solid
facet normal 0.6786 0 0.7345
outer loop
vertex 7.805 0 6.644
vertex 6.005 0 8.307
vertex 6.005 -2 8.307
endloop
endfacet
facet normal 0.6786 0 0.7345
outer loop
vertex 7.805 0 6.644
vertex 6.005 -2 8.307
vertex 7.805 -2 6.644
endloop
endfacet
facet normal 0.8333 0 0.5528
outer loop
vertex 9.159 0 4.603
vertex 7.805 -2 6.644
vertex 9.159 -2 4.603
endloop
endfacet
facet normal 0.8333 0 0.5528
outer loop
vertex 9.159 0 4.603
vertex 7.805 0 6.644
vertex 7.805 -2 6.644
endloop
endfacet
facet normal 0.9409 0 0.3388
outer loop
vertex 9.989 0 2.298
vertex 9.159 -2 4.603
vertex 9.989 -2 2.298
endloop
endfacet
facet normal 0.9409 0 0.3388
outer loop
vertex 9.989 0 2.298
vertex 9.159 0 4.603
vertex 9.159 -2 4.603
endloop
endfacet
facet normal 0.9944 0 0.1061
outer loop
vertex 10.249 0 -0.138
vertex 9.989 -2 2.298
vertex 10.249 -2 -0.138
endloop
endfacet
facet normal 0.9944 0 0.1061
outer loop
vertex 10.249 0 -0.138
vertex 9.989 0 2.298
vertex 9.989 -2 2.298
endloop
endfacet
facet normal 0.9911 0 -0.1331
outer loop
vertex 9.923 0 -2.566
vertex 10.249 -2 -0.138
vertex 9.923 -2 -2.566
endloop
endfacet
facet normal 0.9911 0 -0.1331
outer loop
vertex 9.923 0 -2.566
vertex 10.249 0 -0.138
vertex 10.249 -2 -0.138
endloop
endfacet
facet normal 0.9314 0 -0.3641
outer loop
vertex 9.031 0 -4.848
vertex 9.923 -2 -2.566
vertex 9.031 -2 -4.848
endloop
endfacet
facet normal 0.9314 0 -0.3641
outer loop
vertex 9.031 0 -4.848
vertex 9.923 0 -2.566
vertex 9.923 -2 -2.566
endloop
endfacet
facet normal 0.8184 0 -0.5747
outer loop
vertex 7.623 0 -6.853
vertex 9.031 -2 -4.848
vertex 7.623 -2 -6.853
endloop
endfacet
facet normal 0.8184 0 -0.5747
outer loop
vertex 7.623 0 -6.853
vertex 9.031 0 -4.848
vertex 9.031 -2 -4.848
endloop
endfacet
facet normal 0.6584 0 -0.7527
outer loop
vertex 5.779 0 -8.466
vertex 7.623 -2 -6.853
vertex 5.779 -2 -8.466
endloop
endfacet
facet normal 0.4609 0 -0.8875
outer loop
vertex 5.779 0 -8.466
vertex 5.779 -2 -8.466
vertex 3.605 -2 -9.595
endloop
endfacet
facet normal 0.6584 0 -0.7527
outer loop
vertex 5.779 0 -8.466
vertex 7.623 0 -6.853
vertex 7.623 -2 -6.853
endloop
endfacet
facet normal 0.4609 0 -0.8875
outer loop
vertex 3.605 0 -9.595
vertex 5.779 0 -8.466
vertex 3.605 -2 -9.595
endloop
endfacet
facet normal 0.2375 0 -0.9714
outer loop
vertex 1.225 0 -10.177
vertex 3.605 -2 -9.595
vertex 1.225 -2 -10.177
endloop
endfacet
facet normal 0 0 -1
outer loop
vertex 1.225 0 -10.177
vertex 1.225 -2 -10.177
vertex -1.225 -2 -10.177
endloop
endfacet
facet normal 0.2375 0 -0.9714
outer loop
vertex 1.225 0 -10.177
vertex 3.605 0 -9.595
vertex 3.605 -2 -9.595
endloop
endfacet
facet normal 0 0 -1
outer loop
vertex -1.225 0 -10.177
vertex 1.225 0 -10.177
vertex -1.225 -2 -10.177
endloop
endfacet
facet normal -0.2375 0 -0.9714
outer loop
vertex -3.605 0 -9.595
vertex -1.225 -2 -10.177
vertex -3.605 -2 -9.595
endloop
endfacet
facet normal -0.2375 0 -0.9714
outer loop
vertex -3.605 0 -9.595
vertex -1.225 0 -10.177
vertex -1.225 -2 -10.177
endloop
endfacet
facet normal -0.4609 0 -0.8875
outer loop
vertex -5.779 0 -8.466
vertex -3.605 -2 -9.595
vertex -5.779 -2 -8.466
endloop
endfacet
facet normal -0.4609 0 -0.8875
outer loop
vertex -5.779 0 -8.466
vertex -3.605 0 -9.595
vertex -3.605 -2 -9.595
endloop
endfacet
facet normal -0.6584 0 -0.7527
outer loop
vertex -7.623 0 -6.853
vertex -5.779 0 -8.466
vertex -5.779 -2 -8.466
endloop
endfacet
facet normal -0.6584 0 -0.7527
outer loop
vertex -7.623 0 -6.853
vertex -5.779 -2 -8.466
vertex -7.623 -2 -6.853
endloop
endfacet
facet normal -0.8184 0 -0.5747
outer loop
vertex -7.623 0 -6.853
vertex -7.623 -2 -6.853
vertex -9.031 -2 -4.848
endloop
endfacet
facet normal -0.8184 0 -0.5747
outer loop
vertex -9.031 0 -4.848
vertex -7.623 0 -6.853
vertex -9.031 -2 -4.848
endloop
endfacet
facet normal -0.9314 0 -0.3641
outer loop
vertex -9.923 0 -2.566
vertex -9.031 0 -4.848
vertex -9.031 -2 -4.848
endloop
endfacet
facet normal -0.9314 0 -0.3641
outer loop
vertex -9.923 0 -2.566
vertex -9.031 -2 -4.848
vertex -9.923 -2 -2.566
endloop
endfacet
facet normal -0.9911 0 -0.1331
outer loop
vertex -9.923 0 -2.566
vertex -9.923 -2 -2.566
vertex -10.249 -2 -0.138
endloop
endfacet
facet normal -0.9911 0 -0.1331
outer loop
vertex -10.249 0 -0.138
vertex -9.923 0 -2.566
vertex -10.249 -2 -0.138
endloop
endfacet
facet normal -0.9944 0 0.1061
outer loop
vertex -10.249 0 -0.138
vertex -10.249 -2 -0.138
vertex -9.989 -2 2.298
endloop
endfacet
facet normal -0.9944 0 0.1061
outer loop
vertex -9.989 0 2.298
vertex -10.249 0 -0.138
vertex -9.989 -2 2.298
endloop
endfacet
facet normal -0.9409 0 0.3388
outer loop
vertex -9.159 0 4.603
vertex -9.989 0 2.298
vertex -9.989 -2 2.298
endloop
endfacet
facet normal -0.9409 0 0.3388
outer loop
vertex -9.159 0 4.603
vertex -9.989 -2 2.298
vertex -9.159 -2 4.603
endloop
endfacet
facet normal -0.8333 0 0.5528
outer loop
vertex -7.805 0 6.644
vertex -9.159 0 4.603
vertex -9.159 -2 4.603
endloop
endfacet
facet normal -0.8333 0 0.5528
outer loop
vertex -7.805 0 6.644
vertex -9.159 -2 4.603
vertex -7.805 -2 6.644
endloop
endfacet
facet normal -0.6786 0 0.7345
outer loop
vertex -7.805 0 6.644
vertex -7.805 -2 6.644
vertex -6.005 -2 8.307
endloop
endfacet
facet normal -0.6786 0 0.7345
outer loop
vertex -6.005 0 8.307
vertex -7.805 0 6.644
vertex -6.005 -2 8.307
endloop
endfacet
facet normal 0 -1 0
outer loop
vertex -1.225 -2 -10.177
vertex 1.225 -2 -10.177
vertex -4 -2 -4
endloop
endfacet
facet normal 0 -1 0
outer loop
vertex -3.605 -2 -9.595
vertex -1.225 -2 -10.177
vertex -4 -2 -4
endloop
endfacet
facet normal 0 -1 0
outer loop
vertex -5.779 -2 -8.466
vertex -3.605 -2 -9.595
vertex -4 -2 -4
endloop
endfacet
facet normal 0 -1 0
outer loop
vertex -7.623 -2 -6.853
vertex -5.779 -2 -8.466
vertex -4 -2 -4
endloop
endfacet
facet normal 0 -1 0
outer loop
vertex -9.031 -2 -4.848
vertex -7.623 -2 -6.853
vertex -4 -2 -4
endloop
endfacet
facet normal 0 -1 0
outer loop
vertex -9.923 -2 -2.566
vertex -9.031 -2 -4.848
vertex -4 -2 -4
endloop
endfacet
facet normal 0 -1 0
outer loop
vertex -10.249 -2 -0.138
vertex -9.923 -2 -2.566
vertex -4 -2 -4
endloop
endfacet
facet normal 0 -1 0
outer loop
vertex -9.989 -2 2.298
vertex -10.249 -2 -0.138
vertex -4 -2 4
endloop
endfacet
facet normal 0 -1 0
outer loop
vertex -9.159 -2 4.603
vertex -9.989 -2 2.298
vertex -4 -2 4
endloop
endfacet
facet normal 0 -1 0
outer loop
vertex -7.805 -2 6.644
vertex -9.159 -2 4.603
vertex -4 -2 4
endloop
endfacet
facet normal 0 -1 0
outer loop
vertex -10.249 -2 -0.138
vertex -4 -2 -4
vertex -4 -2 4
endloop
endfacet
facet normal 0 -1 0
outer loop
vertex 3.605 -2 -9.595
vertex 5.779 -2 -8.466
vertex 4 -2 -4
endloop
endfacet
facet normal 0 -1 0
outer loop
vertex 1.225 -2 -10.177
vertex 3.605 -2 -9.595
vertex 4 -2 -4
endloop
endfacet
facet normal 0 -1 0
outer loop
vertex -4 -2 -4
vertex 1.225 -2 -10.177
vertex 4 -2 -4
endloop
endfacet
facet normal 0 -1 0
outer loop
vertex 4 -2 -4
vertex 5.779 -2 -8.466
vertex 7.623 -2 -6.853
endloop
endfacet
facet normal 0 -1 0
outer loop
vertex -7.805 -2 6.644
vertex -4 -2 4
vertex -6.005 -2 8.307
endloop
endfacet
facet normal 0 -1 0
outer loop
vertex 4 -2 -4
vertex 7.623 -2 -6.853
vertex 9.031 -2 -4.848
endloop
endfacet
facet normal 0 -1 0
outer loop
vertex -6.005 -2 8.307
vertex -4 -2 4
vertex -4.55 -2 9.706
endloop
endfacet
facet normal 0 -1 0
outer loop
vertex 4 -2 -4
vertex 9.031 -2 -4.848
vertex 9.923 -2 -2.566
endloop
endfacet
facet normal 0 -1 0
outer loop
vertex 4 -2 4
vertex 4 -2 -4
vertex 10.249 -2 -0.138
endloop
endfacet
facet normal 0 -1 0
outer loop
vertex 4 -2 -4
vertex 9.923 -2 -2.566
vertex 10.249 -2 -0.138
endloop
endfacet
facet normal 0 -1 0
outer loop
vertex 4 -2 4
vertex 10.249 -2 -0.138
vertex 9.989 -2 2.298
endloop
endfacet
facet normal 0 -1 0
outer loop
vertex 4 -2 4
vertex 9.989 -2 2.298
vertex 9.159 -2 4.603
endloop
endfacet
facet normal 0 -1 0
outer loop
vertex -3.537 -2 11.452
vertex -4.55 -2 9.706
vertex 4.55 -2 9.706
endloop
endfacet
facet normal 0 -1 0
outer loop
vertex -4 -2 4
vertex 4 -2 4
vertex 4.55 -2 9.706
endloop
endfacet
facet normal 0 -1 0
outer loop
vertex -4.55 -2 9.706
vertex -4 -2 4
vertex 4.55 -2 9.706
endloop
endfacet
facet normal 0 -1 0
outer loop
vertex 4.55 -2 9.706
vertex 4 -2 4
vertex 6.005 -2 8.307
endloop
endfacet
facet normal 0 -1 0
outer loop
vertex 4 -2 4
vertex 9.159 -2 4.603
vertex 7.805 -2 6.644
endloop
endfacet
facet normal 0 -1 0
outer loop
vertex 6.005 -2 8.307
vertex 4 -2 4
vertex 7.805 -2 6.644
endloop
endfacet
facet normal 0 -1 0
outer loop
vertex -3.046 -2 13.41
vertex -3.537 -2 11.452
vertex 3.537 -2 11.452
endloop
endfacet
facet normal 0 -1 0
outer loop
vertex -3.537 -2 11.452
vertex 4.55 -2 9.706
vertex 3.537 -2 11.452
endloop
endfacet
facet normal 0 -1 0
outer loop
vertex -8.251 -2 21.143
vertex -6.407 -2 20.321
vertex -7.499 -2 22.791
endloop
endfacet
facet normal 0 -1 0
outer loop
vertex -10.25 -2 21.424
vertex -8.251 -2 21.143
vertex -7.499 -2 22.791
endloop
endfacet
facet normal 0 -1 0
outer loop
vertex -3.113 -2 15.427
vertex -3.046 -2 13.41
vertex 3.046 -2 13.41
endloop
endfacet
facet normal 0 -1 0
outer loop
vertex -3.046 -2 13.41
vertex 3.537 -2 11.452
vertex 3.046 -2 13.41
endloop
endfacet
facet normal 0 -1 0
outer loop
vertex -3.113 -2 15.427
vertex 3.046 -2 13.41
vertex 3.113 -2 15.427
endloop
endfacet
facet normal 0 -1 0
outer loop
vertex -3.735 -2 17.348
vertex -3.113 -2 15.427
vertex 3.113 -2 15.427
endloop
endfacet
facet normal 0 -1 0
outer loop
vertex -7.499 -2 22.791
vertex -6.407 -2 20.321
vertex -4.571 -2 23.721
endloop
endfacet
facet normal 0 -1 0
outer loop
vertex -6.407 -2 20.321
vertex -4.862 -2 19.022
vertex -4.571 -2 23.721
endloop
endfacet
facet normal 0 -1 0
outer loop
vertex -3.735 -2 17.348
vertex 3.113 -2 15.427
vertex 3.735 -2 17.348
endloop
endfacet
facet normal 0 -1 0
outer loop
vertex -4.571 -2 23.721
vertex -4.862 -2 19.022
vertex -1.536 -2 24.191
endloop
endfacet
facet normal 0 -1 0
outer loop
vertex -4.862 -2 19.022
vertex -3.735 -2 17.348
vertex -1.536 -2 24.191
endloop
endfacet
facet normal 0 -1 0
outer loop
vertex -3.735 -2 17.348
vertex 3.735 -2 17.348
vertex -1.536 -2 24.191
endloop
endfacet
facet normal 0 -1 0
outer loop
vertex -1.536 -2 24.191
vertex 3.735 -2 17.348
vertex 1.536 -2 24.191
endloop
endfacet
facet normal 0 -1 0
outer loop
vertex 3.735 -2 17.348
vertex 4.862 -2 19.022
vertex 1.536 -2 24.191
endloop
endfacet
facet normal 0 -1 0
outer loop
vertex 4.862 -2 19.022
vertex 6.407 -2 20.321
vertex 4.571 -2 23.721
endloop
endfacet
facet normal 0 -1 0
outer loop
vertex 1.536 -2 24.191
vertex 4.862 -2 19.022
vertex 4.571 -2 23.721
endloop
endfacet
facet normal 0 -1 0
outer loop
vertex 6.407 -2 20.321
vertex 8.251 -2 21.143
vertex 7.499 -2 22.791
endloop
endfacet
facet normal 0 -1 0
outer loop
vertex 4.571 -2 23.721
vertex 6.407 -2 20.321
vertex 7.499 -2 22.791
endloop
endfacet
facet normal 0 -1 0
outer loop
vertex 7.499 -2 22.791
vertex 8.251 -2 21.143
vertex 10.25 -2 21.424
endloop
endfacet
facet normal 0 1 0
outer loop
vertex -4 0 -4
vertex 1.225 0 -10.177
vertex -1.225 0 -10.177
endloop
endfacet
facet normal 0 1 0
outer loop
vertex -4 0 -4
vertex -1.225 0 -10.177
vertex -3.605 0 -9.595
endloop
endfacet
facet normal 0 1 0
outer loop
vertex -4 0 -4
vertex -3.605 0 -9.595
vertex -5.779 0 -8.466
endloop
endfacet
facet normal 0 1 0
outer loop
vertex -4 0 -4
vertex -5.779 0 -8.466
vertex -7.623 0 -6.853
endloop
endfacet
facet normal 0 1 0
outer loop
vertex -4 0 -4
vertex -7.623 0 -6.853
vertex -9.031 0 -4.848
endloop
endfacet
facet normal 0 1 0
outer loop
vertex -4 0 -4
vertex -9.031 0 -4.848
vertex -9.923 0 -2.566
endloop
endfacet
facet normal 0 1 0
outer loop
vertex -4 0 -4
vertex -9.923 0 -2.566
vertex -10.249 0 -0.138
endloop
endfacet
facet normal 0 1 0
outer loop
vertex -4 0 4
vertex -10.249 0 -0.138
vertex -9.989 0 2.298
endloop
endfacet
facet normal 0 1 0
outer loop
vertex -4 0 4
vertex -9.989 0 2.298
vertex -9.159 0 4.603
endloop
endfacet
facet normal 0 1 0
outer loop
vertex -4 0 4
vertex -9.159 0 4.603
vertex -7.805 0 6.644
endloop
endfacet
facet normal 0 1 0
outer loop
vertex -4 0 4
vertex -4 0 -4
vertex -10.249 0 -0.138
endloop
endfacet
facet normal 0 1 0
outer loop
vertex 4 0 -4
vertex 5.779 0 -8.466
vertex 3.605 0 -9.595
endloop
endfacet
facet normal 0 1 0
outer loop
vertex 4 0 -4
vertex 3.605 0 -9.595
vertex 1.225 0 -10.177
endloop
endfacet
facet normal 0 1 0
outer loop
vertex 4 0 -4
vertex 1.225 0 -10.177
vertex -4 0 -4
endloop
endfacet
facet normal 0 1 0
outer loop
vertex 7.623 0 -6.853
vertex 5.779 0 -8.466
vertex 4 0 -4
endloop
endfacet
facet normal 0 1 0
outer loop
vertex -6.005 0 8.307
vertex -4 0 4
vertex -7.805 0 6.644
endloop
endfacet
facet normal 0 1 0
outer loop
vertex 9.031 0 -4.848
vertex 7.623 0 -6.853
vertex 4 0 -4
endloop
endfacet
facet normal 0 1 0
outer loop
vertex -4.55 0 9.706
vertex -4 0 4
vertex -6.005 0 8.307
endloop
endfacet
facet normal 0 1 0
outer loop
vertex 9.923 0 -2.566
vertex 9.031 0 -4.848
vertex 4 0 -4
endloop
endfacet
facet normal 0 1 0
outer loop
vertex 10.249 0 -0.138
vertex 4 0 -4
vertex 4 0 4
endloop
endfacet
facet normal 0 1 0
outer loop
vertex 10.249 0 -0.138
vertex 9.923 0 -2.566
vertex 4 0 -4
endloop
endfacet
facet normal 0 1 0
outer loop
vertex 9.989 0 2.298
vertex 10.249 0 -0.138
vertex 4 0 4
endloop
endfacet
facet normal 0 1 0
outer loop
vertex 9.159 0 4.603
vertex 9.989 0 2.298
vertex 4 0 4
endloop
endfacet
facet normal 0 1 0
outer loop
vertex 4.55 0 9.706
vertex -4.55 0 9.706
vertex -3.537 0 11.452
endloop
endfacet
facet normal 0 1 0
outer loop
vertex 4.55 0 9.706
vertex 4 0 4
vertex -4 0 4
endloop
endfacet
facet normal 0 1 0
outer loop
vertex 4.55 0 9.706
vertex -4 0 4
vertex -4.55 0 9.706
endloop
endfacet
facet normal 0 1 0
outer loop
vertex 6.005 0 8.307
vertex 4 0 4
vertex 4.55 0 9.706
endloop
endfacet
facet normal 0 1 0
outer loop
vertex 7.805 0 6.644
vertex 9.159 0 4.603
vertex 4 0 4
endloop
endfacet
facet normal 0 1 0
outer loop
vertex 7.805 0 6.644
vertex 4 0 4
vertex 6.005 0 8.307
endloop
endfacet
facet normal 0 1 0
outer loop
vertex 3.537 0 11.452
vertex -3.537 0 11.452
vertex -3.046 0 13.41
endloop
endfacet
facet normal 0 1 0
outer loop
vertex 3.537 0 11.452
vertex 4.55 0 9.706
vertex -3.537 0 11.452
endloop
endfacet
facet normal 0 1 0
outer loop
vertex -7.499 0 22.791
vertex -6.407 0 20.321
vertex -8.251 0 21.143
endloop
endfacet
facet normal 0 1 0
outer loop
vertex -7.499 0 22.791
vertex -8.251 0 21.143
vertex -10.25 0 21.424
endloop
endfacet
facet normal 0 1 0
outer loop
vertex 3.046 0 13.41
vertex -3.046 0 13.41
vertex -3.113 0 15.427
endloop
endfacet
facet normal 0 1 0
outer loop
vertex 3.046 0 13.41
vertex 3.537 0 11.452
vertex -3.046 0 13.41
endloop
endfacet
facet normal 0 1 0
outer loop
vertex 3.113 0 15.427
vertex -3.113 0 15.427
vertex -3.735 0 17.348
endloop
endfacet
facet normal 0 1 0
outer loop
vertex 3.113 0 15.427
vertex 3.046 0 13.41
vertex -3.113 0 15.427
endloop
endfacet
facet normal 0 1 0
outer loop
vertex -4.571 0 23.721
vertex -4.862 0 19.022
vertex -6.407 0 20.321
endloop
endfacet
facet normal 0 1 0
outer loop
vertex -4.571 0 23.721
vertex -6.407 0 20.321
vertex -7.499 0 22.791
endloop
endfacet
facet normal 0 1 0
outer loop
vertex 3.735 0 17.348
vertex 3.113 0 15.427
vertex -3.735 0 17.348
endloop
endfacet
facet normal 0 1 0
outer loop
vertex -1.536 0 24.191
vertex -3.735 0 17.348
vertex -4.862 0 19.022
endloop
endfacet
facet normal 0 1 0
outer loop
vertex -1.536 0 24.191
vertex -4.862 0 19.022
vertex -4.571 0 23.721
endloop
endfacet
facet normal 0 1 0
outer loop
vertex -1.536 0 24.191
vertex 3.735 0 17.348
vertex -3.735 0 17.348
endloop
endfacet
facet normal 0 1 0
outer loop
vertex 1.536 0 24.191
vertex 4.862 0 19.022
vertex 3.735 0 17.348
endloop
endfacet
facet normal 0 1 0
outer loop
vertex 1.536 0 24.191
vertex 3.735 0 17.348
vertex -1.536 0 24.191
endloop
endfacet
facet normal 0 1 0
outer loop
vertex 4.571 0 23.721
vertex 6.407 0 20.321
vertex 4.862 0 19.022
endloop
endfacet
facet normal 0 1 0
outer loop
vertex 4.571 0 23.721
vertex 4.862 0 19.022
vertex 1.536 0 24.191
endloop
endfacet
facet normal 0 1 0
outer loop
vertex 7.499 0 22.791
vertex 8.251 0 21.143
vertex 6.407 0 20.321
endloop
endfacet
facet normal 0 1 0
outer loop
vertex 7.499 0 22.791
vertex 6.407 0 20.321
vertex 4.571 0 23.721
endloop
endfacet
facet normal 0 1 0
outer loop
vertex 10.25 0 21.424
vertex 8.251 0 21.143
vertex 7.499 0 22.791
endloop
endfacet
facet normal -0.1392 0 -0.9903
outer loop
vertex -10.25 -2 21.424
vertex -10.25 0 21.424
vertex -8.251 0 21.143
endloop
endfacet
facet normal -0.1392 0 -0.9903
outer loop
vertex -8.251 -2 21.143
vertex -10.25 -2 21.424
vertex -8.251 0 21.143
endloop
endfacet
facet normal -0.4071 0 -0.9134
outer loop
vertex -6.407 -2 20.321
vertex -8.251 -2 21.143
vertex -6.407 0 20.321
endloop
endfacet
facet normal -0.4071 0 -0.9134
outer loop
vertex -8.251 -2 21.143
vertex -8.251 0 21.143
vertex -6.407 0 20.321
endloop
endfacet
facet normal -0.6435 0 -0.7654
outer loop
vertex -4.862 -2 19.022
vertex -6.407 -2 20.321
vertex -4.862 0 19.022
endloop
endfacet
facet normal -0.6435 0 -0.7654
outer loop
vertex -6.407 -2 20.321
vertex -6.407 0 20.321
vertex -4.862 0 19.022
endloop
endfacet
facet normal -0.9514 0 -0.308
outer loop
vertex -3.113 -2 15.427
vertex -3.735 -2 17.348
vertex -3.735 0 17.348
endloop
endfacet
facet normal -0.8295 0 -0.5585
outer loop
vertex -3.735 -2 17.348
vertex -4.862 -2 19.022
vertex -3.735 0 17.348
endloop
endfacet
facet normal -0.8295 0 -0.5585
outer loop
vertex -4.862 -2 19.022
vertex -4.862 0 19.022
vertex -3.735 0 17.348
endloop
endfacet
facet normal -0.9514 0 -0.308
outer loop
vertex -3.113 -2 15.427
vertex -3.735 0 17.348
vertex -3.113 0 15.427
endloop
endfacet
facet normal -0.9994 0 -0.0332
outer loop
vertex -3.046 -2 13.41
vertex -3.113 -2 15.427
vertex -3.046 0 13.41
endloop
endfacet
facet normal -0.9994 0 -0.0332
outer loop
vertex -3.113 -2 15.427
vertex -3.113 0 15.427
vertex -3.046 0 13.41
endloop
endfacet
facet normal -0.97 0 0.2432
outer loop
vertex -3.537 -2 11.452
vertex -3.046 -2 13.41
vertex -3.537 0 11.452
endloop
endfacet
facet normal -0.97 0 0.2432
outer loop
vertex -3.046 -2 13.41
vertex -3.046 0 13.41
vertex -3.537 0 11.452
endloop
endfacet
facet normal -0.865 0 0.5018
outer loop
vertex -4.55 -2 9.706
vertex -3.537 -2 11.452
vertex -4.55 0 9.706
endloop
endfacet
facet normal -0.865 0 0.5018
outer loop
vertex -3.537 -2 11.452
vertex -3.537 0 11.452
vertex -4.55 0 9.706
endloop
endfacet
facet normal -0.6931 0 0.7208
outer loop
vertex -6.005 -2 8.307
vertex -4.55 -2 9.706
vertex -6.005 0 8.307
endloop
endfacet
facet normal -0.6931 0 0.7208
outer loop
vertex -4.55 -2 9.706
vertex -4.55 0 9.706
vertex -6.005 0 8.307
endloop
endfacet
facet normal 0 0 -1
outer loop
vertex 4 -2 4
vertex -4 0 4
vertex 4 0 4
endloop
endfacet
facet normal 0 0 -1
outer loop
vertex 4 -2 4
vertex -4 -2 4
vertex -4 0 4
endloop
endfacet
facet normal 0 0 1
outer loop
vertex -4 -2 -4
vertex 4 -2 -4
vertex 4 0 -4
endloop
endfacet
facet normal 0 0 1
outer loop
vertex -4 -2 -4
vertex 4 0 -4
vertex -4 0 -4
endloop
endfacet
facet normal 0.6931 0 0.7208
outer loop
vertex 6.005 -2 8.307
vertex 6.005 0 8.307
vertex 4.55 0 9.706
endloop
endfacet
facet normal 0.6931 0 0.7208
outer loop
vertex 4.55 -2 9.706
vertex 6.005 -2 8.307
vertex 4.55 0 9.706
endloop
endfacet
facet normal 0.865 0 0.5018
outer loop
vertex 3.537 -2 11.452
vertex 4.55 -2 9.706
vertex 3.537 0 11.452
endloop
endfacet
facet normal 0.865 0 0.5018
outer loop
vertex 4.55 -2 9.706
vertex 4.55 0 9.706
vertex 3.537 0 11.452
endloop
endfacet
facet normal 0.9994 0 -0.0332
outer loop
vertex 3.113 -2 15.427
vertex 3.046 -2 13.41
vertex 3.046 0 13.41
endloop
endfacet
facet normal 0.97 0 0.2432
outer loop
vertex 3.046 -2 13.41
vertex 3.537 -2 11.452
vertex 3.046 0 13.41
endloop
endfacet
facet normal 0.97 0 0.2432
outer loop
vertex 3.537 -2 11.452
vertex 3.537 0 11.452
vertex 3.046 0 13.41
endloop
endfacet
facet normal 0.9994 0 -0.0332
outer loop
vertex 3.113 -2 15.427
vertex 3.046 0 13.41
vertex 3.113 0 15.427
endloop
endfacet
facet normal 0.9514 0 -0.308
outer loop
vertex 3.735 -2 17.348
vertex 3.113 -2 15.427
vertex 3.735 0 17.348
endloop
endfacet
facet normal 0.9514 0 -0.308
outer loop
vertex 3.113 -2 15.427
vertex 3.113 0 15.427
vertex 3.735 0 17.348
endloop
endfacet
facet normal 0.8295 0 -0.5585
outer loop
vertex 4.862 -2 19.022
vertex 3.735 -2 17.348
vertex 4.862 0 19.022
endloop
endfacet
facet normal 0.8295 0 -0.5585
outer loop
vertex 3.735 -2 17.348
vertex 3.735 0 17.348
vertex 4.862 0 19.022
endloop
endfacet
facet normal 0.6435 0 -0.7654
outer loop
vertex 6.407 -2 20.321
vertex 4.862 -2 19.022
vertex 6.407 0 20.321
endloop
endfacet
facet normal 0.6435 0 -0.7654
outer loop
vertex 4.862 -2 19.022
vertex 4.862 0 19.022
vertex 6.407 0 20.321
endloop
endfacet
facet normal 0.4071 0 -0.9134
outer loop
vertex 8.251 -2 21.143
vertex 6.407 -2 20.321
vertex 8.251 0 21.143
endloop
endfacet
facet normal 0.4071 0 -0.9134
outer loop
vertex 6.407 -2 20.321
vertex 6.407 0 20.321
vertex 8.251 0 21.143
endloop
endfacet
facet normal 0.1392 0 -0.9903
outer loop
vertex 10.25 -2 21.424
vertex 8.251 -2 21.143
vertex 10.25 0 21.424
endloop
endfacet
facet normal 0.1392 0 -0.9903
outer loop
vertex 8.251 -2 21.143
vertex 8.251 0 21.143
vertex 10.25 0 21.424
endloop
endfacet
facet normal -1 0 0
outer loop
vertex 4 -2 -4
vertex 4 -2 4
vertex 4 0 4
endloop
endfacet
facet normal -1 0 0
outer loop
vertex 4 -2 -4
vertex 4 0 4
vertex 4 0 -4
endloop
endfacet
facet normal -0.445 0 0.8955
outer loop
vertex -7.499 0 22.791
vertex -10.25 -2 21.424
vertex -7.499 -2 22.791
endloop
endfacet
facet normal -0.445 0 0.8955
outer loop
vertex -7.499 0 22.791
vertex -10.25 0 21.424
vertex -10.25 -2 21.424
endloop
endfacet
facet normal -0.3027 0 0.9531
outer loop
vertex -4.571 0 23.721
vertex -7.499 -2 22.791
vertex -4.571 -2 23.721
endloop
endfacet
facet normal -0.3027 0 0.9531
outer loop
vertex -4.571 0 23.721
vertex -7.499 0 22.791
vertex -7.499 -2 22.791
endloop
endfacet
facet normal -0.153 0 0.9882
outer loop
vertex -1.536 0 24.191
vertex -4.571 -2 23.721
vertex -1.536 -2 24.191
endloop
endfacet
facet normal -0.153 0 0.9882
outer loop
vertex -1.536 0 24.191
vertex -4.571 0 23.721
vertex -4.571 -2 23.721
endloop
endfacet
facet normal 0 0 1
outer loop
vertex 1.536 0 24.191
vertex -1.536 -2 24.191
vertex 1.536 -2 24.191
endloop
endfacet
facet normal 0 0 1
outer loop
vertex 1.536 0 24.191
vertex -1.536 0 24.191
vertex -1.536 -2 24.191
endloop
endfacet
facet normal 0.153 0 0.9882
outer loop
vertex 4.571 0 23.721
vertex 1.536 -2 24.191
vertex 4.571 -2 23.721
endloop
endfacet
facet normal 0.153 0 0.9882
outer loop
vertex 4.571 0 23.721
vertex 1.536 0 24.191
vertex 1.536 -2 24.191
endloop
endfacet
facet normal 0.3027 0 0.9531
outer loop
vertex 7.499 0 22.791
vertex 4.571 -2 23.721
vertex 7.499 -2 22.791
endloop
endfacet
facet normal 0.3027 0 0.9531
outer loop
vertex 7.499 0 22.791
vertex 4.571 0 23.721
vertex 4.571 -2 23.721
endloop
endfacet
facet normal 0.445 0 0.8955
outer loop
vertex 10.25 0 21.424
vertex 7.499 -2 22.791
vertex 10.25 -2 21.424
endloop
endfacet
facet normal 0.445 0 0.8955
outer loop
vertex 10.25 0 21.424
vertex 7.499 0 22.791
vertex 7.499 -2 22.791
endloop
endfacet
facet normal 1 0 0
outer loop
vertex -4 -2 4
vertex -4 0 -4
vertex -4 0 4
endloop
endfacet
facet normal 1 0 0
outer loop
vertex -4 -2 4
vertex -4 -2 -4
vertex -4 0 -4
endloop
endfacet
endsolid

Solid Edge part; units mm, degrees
sketch "Sketch1" plane through (0, 0, 0) normal (0, -1, 0) x (1, 0, 0)
  arc A0 (-6.0052, 8.3067) -> (-10.25, 21.4237) centre (-10.25, 14.1784) ccw
  arc A1 (-10.25, 21.4237) -> (10.25, 21.4237) centre (0, 4.25) cw
  arc A2 (10.25, 21.4237) -> (6.0052, 8.3067) centre (10.25, 14.1784) ccw
  arc A3 (6.0052, 8.3067) -> (-6.0052, 8.3067) centre (0, 0) cw
  dimension "D1" = 6.0052
extrude "Protrusion1" add sketch "Sketch1" along normal blind 2
sketch "Sketch2" plane through (0, -2, 7) normal (0, -1, 0) x (1, 0, 0)
  line L0 (-4, -3) -> (4, -3)
  line L1 (4, -3) -> (4, -11)
  line L2 (4, -11) -> (-4, -11)
  line L3 (-4, -11) -> (-4, -3)
  dimension "D1" = 8
  dimension "D2" = 8
extrude "Cutout1" cut sketch "Sketch2" against normal through all
